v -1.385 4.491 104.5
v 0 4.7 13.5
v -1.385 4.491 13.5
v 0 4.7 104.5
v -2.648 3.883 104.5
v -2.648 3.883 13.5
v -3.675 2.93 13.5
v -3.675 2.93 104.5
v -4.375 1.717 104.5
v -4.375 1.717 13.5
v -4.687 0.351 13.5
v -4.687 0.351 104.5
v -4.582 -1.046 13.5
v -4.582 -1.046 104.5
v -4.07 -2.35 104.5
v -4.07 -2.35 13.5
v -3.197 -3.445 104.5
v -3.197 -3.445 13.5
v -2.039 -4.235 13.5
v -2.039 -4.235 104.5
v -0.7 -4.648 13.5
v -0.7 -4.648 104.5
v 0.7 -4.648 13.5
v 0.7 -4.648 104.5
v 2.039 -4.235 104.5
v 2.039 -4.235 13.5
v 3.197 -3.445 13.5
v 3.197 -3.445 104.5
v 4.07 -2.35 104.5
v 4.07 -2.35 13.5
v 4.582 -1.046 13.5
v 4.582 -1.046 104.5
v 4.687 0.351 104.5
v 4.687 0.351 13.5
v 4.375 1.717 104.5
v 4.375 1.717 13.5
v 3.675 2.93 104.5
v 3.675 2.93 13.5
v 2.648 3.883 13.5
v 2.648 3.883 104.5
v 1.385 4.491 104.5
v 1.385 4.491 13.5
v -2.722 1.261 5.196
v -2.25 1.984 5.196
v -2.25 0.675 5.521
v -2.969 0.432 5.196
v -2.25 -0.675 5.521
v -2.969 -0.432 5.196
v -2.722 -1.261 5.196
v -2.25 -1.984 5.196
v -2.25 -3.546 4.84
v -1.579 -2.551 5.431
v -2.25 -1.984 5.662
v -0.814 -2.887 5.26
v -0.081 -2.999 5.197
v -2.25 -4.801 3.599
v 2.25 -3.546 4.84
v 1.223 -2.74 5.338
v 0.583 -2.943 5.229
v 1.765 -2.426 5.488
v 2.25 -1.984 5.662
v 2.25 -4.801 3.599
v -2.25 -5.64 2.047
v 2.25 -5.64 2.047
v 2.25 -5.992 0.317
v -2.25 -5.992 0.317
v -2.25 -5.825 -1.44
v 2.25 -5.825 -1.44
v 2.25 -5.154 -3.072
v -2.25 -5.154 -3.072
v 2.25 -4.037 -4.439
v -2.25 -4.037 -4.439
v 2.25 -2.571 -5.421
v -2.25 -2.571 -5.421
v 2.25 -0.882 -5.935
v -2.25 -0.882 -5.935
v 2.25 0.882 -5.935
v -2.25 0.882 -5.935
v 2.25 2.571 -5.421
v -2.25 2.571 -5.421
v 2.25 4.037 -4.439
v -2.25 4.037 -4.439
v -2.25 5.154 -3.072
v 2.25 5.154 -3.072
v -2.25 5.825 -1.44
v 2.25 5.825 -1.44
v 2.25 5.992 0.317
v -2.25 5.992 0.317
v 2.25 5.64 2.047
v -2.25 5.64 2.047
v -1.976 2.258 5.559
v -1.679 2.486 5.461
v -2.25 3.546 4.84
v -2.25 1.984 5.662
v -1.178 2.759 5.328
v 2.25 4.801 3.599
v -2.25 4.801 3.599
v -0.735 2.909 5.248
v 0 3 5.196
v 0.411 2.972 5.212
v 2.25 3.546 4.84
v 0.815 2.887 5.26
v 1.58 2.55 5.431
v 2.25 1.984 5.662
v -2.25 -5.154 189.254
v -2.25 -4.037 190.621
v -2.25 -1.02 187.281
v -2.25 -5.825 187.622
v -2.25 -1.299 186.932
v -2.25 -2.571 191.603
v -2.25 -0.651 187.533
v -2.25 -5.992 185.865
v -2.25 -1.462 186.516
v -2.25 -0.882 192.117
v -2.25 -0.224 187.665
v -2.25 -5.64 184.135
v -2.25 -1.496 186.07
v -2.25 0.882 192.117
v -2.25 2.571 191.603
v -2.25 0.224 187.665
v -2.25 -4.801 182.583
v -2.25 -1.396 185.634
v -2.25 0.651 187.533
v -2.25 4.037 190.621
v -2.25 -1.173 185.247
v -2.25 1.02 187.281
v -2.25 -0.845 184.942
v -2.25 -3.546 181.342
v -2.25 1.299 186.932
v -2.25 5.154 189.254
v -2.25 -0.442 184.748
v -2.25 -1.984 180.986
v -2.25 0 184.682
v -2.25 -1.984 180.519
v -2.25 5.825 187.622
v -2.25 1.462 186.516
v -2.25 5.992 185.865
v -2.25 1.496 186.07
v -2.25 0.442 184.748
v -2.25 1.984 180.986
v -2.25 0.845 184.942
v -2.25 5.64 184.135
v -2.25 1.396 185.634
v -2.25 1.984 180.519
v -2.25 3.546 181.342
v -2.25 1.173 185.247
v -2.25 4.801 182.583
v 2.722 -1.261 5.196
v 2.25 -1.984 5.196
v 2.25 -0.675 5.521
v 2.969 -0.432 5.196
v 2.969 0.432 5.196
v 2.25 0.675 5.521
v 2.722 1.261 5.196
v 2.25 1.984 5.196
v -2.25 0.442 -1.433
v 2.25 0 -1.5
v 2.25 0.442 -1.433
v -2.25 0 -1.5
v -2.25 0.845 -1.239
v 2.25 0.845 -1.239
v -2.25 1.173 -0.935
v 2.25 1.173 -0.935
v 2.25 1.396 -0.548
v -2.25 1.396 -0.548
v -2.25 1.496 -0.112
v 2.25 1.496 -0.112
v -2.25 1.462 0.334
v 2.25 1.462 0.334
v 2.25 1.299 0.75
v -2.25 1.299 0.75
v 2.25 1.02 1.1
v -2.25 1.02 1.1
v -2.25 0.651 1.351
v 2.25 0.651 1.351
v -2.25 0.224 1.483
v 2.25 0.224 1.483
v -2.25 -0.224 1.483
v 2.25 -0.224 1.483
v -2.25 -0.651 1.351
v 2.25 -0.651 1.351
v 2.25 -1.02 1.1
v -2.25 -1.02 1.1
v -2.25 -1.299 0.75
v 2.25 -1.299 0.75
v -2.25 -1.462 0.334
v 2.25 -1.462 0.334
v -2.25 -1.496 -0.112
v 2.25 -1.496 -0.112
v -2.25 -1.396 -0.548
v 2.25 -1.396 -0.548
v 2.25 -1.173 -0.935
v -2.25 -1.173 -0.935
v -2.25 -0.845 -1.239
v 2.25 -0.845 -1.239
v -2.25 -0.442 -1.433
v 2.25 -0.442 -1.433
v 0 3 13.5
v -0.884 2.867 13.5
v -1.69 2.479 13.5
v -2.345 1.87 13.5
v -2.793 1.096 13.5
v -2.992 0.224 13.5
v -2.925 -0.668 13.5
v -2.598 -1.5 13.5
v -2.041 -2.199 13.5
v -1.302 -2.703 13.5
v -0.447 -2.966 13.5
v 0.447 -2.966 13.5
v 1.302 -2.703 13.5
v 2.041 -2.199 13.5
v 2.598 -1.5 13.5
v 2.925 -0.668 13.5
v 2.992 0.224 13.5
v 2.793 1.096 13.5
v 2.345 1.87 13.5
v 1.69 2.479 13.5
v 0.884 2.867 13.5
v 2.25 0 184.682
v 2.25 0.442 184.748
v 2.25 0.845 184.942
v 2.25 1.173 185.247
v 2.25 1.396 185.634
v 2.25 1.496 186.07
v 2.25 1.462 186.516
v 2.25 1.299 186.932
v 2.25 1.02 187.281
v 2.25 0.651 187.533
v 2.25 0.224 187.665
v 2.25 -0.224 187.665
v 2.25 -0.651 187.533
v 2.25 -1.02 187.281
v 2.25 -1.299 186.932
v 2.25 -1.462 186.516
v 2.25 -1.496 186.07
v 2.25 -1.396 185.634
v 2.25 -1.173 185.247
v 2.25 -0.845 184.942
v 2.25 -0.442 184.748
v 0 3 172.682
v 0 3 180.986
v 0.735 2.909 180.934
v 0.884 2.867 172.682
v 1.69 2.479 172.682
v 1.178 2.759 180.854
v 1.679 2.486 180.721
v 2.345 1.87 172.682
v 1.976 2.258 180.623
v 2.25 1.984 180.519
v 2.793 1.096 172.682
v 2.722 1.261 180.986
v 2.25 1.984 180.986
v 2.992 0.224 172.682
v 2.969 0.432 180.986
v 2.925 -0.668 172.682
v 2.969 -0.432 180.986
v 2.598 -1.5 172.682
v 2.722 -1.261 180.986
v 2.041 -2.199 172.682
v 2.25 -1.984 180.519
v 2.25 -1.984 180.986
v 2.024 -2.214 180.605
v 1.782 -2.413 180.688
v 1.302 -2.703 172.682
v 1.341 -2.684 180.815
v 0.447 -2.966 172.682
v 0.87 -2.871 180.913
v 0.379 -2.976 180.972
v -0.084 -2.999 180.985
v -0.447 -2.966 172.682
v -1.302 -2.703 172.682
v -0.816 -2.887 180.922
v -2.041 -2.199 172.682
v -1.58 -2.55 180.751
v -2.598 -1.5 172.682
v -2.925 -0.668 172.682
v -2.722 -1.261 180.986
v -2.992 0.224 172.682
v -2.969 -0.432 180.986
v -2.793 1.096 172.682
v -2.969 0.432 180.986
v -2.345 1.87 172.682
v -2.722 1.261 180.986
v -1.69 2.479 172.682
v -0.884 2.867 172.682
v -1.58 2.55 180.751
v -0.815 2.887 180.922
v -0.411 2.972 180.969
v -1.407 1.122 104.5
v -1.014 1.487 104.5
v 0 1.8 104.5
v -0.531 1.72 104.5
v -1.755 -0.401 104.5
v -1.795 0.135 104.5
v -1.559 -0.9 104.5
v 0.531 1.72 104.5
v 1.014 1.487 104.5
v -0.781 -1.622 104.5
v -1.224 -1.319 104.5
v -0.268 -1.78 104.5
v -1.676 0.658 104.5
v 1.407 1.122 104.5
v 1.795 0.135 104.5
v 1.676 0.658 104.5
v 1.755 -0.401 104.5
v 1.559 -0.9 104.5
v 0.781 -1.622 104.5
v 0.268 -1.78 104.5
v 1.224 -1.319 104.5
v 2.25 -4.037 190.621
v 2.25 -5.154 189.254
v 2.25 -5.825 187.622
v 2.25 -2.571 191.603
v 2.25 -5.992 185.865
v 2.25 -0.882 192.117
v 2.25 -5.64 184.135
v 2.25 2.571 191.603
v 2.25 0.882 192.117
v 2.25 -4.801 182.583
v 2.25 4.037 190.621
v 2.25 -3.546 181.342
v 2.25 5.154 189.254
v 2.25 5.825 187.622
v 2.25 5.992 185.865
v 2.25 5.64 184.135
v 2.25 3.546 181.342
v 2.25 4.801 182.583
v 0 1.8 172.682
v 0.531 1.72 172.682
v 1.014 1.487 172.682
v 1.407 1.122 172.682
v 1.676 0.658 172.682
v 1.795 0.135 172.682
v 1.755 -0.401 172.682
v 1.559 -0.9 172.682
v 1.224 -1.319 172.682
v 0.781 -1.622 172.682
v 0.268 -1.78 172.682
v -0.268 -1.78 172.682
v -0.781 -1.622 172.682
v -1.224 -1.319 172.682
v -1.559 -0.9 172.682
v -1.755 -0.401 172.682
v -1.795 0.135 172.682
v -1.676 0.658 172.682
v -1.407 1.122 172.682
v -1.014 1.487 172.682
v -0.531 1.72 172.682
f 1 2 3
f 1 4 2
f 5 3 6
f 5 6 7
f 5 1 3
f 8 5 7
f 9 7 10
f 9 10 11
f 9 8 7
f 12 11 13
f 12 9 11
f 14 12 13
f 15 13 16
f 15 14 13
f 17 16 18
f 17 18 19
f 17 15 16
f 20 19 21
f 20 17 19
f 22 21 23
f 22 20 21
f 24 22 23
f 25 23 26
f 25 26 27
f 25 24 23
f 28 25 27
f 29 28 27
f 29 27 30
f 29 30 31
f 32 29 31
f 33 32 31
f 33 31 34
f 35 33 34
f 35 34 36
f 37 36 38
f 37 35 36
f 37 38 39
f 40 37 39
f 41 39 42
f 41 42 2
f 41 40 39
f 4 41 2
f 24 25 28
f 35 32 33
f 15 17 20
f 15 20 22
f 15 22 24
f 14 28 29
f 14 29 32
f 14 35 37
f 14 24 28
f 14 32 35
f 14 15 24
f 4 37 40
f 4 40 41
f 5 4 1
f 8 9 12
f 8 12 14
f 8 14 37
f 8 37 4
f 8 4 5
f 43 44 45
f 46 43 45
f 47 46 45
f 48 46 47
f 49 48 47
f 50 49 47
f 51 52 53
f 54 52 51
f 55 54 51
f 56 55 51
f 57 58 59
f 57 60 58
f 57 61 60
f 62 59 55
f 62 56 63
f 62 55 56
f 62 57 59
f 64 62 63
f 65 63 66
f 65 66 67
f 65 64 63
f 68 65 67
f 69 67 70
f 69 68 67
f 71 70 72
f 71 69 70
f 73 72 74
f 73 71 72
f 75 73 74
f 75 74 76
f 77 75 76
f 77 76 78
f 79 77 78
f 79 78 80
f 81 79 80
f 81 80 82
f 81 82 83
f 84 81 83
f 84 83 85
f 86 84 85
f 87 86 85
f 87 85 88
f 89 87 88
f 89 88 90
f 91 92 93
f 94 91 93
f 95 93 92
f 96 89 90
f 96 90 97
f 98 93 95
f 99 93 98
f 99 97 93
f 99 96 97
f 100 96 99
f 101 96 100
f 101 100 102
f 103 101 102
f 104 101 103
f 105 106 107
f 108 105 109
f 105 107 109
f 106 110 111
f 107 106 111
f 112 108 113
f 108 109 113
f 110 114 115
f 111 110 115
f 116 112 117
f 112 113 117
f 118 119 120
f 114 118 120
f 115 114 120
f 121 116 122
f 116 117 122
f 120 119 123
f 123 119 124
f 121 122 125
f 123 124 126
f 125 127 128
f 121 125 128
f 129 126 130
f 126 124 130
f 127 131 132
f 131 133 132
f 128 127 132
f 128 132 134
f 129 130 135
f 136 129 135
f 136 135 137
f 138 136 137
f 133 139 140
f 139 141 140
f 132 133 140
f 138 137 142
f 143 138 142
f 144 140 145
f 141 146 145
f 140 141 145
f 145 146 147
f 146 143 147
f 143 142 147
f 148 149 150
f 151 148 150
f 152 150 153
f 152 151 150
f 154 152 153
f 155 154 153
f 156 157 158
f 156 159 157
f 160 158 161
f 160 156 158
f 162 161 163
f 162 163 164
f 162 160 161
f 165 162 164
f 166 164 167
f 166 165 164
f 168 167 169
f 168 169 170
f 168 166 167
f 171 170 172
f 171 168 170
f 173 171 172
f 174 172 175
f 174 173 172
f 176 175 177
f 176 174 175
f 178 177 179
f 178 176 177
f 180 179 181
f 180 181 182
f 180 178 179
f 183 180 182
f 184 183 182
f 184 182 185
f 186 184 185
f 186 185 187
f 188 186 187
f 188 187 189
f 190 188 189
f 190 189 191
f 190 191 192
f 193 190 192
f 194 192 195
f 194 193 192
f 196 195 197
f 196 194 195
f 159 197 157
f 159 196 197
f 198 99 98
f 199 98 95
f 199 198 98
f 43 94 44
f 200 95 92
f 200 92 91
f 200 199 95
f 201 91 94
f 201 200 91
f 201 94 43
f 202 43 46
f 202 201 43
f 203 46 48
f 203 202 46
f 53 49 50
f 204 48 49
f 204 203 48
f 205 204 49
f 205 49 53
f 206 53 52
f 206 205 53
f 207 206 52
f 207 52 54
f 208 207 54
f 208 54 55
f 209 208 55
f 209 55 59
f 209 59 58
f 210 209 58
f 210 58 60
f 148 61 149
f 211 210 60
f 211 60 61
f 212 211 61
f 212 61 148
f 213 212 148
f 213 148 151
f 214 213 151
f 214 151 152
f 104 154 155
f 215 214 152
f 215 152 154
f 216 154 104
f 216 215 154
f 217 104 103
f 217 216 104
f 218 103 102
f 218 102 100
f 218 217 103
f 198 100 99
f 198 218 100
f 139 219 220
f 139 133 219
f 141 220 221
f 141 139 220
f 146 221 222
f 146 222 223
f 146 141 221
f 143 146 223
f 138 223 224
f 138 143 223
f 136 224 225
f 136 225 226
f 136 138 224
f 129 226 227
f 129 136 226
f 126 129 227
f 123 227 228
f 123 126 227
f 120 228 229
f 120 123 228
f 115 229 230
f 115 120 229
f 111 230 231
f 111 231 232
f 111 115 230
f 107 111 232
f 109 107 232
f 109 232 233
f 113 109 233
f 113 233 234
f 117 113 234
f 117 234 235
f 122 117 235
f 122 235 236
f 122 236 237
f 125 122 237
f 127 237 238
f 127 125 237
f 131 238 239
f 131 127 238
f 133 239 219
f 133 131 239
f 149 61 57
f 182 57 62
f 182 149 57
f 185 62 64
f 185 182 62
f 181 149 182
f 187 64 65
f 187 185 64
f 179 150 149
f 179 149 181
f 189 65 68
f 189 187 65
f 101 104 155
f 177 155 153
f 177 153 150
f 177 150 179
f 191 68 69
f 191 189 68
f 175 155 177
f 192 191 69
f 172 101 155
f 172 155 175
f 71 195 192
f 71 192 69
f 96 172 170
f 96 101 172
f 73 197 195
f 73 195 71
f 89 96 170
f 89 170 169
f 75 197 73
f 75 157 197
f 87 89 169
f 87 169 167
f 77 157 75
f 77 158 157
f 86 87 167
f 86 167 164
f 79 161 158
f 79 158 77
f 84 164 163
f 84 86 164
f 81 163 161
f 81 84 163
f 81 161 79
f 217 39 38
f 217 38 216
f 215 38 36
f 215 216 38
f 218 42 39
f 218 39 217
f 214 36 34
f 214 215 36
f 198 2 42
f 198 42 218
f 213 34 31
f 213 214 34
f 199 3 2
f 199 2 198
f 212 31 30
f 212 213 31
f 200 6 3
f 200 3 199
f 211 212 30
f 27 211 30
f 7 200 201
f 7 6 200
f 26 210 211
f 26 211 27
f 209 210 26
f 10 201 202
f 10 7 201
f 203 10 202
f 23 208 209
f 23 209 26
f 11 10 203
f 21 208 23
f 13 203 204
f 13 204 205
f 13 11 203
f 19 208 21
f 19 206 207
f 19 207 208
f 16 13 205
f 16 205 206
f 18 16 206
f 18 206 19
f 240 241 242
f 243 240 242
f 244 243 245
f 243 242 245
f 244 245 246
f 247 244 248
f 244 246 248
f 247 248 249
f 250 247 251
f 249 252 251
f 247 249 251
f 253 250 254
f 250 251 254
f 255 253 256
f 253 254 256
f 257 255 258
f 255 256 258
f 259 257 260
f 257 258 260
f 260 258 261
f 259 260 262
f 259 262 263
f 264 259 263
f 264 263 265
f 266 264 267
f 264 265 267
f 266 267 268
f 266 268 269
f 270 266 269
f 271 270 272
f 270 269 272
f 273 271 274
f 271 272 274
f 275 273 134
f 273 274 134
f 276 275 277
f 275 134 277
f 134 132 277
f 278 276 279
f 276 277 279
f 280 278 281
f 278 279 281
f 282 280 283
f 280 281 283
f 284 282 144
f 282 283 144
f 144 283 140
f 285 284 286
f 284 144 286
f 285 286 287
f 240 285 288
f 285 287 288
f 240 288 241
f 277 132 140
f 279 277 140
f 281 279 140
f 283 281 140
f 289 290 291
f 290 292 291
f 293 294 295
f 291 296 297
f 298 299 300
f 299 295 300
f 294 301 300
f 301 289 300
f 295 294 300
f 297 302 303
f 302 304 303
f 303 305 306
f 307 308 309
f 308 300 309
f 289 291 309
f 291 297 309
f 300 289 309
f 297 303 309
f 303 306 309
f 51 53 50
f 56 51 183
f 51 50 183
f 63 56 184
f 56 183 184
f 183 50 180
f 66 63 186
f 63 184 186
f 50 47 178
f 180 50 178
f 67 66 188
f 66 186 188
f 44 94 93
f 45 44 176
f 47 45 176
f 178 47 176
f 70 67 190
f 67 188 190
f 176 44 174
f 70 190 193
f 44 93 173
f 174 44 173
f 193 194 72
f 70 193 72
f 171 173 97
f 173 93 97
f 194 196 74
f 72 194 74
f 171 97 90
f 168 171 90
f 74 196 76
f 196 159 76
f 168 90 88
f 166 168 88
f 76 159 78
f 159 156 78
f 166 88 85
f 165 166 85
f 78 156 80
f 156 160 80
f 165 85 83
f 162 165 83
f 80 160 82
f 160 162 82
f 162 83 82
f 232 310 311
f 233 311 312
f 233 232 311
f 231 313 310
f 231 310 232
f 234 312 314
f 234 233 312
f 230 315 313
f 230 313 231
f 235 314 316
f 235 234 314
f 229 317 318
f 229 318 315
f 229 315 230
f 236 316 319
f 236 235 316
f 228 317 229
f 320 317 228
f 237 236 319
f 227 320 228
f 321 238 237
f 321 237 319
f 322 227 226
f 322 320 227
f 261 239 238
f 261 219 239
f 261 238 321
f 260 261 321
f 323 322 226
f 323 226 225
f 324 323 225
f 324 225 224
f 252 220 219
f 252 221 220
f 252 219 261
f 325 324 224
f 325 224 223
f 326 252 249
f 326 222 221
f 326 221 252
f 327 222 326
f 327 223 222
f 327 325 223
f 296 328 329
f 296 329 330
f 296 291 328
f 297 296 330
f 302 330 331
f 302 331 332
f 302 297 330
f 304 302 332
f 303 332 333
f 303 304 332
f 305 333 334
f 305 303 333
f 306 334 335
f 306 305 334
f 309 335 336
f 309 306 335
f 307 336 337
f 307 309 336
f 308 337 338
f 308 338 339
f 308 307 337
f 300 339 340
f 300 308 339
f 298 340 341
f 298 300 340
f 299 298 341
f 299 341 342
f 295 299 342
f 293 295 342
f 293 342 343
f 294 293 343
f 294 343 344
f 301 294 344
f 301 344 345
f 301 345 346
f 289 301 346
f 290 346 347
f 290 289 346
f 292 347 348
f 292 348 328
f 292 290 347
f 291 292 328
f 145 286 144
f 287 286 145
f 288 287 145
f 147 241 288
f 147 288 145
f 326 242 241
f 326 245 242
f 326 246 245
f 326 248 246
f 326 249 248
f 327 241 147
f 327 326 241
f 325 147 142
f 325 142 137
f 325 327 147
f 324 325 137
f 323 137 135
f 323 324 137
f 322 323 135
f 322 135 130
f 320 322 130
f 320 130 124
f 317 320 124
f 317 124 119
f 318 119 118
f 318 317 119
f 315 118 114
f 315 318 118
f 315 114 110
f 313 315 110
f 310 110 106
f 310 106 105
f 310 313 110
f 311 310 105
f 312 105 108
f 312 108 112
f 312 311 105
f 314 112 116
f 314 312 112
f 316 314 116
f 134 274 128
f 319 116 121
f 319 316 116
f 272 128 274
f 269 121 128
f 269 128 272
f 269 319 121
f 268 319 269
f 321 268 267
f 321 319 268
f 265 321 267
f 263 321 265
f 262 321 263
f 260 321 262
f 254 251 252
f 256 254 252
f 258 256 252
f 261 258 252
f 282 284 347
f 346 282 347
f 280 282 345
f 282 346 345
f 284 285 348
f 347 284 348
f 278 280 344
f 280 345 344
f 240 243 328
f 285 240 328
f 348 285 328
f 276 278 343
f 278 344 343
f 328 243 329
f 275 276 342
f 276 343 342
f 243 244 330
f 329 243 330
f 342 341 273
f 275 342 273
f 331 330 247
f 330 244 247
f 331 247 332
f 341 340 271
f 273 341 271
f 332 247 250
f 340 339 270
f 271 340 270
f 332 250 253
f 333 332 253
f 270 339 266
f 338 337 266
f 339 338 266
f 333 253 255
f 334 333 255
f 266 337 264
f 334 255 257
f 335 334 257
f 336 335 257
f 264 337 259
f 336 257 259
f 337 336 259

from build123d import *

# Parameters (mm, degrees)
SKETCH1_R             = 6
SKETCH1_R_2           = 1.5
BOSS_EXTRUDE1_DEPTH   = 2.25
BOSS_EXTRUDE1_2_DEPTH = 2.25


with BuildPart() as part:
    # Sketch1 → Boss-Extrude1 (new, symmetric)
    with BuildSketch(Plane(origin=(0, 0, 0), x_dir=(0, 0, -1), z_dir=(1, 0, 0))):
        Circle(SKETCH1_R)
        Circle(SKETCH1_R_2, mode=Mode.SUBTRACT)
    extrude(amount=BOSS_EXTRUDE1_DEPTH, both=True)

    # Sketch1<3> → Revolve1 (revolve)
    with BuildSketch(Plane(origin=(0, 0, 0), x_dir=(0, 0, -1), z_dir=(1, 0, 0))):
        with BuildLine():
            Line((-5.196152423, 3), (-13.5, 3))
            Line((-13.5, 3), (-13.5, 4.7))
            Line((-13.5, 4.7), (-104.5, 4.7))
            Line((-104.5, 4.7), (-104.5, 0))
            Line((-104.5, 0), (-6, 0))
            ThreePointArc((-6, 0), (-5.795554958, 1.552914271), (-5.196152423, 3))
        make_face()
    revolve(axis=Axis((0, 0, 13.5), (0, 0, 1)))


with BuildPart() as body_2:
    # Sketch1 → Boss-Extrude1 2 (new, symmetric)
    with BuildSketch(Plane(origin=(0, 0, 0), x_dir=(0, 0, -1), z_dir=(1, 0, 0))):
        with Locations((-186.181752409, 0)):
            Circle(SKETCH1_R)
        with Locations((-186.181752409, 0)):
            Circle(SKETCH1_R_2, mode=Mode.SUBTRACT)
    extrude(amount=BOSS_EXTRUDE1_2_DEPTH, both=True)


with BuildPart() as body_3:
    # Sketch1<62> → Revolve2 (revolve)
    with BuildSketch(Plane(origin=(0, 0, 0), x_dir=(0, 0, -1), z_dir=(1, 0, 0))):
        Polygon((-104.5, 0), (-104.5, 1.8), (-172.681752409, 1.8), (-172.681752409, 3), (-180.985599986, 3), (-180.985599986, 0), align=None)
    revolve(axis=Axis((0, 0, 172.681752409), (0, 0, -1)))

    # Combine1: union body 2
    add(body_2.part)


solid = Compound([part.part, body_3.part])
